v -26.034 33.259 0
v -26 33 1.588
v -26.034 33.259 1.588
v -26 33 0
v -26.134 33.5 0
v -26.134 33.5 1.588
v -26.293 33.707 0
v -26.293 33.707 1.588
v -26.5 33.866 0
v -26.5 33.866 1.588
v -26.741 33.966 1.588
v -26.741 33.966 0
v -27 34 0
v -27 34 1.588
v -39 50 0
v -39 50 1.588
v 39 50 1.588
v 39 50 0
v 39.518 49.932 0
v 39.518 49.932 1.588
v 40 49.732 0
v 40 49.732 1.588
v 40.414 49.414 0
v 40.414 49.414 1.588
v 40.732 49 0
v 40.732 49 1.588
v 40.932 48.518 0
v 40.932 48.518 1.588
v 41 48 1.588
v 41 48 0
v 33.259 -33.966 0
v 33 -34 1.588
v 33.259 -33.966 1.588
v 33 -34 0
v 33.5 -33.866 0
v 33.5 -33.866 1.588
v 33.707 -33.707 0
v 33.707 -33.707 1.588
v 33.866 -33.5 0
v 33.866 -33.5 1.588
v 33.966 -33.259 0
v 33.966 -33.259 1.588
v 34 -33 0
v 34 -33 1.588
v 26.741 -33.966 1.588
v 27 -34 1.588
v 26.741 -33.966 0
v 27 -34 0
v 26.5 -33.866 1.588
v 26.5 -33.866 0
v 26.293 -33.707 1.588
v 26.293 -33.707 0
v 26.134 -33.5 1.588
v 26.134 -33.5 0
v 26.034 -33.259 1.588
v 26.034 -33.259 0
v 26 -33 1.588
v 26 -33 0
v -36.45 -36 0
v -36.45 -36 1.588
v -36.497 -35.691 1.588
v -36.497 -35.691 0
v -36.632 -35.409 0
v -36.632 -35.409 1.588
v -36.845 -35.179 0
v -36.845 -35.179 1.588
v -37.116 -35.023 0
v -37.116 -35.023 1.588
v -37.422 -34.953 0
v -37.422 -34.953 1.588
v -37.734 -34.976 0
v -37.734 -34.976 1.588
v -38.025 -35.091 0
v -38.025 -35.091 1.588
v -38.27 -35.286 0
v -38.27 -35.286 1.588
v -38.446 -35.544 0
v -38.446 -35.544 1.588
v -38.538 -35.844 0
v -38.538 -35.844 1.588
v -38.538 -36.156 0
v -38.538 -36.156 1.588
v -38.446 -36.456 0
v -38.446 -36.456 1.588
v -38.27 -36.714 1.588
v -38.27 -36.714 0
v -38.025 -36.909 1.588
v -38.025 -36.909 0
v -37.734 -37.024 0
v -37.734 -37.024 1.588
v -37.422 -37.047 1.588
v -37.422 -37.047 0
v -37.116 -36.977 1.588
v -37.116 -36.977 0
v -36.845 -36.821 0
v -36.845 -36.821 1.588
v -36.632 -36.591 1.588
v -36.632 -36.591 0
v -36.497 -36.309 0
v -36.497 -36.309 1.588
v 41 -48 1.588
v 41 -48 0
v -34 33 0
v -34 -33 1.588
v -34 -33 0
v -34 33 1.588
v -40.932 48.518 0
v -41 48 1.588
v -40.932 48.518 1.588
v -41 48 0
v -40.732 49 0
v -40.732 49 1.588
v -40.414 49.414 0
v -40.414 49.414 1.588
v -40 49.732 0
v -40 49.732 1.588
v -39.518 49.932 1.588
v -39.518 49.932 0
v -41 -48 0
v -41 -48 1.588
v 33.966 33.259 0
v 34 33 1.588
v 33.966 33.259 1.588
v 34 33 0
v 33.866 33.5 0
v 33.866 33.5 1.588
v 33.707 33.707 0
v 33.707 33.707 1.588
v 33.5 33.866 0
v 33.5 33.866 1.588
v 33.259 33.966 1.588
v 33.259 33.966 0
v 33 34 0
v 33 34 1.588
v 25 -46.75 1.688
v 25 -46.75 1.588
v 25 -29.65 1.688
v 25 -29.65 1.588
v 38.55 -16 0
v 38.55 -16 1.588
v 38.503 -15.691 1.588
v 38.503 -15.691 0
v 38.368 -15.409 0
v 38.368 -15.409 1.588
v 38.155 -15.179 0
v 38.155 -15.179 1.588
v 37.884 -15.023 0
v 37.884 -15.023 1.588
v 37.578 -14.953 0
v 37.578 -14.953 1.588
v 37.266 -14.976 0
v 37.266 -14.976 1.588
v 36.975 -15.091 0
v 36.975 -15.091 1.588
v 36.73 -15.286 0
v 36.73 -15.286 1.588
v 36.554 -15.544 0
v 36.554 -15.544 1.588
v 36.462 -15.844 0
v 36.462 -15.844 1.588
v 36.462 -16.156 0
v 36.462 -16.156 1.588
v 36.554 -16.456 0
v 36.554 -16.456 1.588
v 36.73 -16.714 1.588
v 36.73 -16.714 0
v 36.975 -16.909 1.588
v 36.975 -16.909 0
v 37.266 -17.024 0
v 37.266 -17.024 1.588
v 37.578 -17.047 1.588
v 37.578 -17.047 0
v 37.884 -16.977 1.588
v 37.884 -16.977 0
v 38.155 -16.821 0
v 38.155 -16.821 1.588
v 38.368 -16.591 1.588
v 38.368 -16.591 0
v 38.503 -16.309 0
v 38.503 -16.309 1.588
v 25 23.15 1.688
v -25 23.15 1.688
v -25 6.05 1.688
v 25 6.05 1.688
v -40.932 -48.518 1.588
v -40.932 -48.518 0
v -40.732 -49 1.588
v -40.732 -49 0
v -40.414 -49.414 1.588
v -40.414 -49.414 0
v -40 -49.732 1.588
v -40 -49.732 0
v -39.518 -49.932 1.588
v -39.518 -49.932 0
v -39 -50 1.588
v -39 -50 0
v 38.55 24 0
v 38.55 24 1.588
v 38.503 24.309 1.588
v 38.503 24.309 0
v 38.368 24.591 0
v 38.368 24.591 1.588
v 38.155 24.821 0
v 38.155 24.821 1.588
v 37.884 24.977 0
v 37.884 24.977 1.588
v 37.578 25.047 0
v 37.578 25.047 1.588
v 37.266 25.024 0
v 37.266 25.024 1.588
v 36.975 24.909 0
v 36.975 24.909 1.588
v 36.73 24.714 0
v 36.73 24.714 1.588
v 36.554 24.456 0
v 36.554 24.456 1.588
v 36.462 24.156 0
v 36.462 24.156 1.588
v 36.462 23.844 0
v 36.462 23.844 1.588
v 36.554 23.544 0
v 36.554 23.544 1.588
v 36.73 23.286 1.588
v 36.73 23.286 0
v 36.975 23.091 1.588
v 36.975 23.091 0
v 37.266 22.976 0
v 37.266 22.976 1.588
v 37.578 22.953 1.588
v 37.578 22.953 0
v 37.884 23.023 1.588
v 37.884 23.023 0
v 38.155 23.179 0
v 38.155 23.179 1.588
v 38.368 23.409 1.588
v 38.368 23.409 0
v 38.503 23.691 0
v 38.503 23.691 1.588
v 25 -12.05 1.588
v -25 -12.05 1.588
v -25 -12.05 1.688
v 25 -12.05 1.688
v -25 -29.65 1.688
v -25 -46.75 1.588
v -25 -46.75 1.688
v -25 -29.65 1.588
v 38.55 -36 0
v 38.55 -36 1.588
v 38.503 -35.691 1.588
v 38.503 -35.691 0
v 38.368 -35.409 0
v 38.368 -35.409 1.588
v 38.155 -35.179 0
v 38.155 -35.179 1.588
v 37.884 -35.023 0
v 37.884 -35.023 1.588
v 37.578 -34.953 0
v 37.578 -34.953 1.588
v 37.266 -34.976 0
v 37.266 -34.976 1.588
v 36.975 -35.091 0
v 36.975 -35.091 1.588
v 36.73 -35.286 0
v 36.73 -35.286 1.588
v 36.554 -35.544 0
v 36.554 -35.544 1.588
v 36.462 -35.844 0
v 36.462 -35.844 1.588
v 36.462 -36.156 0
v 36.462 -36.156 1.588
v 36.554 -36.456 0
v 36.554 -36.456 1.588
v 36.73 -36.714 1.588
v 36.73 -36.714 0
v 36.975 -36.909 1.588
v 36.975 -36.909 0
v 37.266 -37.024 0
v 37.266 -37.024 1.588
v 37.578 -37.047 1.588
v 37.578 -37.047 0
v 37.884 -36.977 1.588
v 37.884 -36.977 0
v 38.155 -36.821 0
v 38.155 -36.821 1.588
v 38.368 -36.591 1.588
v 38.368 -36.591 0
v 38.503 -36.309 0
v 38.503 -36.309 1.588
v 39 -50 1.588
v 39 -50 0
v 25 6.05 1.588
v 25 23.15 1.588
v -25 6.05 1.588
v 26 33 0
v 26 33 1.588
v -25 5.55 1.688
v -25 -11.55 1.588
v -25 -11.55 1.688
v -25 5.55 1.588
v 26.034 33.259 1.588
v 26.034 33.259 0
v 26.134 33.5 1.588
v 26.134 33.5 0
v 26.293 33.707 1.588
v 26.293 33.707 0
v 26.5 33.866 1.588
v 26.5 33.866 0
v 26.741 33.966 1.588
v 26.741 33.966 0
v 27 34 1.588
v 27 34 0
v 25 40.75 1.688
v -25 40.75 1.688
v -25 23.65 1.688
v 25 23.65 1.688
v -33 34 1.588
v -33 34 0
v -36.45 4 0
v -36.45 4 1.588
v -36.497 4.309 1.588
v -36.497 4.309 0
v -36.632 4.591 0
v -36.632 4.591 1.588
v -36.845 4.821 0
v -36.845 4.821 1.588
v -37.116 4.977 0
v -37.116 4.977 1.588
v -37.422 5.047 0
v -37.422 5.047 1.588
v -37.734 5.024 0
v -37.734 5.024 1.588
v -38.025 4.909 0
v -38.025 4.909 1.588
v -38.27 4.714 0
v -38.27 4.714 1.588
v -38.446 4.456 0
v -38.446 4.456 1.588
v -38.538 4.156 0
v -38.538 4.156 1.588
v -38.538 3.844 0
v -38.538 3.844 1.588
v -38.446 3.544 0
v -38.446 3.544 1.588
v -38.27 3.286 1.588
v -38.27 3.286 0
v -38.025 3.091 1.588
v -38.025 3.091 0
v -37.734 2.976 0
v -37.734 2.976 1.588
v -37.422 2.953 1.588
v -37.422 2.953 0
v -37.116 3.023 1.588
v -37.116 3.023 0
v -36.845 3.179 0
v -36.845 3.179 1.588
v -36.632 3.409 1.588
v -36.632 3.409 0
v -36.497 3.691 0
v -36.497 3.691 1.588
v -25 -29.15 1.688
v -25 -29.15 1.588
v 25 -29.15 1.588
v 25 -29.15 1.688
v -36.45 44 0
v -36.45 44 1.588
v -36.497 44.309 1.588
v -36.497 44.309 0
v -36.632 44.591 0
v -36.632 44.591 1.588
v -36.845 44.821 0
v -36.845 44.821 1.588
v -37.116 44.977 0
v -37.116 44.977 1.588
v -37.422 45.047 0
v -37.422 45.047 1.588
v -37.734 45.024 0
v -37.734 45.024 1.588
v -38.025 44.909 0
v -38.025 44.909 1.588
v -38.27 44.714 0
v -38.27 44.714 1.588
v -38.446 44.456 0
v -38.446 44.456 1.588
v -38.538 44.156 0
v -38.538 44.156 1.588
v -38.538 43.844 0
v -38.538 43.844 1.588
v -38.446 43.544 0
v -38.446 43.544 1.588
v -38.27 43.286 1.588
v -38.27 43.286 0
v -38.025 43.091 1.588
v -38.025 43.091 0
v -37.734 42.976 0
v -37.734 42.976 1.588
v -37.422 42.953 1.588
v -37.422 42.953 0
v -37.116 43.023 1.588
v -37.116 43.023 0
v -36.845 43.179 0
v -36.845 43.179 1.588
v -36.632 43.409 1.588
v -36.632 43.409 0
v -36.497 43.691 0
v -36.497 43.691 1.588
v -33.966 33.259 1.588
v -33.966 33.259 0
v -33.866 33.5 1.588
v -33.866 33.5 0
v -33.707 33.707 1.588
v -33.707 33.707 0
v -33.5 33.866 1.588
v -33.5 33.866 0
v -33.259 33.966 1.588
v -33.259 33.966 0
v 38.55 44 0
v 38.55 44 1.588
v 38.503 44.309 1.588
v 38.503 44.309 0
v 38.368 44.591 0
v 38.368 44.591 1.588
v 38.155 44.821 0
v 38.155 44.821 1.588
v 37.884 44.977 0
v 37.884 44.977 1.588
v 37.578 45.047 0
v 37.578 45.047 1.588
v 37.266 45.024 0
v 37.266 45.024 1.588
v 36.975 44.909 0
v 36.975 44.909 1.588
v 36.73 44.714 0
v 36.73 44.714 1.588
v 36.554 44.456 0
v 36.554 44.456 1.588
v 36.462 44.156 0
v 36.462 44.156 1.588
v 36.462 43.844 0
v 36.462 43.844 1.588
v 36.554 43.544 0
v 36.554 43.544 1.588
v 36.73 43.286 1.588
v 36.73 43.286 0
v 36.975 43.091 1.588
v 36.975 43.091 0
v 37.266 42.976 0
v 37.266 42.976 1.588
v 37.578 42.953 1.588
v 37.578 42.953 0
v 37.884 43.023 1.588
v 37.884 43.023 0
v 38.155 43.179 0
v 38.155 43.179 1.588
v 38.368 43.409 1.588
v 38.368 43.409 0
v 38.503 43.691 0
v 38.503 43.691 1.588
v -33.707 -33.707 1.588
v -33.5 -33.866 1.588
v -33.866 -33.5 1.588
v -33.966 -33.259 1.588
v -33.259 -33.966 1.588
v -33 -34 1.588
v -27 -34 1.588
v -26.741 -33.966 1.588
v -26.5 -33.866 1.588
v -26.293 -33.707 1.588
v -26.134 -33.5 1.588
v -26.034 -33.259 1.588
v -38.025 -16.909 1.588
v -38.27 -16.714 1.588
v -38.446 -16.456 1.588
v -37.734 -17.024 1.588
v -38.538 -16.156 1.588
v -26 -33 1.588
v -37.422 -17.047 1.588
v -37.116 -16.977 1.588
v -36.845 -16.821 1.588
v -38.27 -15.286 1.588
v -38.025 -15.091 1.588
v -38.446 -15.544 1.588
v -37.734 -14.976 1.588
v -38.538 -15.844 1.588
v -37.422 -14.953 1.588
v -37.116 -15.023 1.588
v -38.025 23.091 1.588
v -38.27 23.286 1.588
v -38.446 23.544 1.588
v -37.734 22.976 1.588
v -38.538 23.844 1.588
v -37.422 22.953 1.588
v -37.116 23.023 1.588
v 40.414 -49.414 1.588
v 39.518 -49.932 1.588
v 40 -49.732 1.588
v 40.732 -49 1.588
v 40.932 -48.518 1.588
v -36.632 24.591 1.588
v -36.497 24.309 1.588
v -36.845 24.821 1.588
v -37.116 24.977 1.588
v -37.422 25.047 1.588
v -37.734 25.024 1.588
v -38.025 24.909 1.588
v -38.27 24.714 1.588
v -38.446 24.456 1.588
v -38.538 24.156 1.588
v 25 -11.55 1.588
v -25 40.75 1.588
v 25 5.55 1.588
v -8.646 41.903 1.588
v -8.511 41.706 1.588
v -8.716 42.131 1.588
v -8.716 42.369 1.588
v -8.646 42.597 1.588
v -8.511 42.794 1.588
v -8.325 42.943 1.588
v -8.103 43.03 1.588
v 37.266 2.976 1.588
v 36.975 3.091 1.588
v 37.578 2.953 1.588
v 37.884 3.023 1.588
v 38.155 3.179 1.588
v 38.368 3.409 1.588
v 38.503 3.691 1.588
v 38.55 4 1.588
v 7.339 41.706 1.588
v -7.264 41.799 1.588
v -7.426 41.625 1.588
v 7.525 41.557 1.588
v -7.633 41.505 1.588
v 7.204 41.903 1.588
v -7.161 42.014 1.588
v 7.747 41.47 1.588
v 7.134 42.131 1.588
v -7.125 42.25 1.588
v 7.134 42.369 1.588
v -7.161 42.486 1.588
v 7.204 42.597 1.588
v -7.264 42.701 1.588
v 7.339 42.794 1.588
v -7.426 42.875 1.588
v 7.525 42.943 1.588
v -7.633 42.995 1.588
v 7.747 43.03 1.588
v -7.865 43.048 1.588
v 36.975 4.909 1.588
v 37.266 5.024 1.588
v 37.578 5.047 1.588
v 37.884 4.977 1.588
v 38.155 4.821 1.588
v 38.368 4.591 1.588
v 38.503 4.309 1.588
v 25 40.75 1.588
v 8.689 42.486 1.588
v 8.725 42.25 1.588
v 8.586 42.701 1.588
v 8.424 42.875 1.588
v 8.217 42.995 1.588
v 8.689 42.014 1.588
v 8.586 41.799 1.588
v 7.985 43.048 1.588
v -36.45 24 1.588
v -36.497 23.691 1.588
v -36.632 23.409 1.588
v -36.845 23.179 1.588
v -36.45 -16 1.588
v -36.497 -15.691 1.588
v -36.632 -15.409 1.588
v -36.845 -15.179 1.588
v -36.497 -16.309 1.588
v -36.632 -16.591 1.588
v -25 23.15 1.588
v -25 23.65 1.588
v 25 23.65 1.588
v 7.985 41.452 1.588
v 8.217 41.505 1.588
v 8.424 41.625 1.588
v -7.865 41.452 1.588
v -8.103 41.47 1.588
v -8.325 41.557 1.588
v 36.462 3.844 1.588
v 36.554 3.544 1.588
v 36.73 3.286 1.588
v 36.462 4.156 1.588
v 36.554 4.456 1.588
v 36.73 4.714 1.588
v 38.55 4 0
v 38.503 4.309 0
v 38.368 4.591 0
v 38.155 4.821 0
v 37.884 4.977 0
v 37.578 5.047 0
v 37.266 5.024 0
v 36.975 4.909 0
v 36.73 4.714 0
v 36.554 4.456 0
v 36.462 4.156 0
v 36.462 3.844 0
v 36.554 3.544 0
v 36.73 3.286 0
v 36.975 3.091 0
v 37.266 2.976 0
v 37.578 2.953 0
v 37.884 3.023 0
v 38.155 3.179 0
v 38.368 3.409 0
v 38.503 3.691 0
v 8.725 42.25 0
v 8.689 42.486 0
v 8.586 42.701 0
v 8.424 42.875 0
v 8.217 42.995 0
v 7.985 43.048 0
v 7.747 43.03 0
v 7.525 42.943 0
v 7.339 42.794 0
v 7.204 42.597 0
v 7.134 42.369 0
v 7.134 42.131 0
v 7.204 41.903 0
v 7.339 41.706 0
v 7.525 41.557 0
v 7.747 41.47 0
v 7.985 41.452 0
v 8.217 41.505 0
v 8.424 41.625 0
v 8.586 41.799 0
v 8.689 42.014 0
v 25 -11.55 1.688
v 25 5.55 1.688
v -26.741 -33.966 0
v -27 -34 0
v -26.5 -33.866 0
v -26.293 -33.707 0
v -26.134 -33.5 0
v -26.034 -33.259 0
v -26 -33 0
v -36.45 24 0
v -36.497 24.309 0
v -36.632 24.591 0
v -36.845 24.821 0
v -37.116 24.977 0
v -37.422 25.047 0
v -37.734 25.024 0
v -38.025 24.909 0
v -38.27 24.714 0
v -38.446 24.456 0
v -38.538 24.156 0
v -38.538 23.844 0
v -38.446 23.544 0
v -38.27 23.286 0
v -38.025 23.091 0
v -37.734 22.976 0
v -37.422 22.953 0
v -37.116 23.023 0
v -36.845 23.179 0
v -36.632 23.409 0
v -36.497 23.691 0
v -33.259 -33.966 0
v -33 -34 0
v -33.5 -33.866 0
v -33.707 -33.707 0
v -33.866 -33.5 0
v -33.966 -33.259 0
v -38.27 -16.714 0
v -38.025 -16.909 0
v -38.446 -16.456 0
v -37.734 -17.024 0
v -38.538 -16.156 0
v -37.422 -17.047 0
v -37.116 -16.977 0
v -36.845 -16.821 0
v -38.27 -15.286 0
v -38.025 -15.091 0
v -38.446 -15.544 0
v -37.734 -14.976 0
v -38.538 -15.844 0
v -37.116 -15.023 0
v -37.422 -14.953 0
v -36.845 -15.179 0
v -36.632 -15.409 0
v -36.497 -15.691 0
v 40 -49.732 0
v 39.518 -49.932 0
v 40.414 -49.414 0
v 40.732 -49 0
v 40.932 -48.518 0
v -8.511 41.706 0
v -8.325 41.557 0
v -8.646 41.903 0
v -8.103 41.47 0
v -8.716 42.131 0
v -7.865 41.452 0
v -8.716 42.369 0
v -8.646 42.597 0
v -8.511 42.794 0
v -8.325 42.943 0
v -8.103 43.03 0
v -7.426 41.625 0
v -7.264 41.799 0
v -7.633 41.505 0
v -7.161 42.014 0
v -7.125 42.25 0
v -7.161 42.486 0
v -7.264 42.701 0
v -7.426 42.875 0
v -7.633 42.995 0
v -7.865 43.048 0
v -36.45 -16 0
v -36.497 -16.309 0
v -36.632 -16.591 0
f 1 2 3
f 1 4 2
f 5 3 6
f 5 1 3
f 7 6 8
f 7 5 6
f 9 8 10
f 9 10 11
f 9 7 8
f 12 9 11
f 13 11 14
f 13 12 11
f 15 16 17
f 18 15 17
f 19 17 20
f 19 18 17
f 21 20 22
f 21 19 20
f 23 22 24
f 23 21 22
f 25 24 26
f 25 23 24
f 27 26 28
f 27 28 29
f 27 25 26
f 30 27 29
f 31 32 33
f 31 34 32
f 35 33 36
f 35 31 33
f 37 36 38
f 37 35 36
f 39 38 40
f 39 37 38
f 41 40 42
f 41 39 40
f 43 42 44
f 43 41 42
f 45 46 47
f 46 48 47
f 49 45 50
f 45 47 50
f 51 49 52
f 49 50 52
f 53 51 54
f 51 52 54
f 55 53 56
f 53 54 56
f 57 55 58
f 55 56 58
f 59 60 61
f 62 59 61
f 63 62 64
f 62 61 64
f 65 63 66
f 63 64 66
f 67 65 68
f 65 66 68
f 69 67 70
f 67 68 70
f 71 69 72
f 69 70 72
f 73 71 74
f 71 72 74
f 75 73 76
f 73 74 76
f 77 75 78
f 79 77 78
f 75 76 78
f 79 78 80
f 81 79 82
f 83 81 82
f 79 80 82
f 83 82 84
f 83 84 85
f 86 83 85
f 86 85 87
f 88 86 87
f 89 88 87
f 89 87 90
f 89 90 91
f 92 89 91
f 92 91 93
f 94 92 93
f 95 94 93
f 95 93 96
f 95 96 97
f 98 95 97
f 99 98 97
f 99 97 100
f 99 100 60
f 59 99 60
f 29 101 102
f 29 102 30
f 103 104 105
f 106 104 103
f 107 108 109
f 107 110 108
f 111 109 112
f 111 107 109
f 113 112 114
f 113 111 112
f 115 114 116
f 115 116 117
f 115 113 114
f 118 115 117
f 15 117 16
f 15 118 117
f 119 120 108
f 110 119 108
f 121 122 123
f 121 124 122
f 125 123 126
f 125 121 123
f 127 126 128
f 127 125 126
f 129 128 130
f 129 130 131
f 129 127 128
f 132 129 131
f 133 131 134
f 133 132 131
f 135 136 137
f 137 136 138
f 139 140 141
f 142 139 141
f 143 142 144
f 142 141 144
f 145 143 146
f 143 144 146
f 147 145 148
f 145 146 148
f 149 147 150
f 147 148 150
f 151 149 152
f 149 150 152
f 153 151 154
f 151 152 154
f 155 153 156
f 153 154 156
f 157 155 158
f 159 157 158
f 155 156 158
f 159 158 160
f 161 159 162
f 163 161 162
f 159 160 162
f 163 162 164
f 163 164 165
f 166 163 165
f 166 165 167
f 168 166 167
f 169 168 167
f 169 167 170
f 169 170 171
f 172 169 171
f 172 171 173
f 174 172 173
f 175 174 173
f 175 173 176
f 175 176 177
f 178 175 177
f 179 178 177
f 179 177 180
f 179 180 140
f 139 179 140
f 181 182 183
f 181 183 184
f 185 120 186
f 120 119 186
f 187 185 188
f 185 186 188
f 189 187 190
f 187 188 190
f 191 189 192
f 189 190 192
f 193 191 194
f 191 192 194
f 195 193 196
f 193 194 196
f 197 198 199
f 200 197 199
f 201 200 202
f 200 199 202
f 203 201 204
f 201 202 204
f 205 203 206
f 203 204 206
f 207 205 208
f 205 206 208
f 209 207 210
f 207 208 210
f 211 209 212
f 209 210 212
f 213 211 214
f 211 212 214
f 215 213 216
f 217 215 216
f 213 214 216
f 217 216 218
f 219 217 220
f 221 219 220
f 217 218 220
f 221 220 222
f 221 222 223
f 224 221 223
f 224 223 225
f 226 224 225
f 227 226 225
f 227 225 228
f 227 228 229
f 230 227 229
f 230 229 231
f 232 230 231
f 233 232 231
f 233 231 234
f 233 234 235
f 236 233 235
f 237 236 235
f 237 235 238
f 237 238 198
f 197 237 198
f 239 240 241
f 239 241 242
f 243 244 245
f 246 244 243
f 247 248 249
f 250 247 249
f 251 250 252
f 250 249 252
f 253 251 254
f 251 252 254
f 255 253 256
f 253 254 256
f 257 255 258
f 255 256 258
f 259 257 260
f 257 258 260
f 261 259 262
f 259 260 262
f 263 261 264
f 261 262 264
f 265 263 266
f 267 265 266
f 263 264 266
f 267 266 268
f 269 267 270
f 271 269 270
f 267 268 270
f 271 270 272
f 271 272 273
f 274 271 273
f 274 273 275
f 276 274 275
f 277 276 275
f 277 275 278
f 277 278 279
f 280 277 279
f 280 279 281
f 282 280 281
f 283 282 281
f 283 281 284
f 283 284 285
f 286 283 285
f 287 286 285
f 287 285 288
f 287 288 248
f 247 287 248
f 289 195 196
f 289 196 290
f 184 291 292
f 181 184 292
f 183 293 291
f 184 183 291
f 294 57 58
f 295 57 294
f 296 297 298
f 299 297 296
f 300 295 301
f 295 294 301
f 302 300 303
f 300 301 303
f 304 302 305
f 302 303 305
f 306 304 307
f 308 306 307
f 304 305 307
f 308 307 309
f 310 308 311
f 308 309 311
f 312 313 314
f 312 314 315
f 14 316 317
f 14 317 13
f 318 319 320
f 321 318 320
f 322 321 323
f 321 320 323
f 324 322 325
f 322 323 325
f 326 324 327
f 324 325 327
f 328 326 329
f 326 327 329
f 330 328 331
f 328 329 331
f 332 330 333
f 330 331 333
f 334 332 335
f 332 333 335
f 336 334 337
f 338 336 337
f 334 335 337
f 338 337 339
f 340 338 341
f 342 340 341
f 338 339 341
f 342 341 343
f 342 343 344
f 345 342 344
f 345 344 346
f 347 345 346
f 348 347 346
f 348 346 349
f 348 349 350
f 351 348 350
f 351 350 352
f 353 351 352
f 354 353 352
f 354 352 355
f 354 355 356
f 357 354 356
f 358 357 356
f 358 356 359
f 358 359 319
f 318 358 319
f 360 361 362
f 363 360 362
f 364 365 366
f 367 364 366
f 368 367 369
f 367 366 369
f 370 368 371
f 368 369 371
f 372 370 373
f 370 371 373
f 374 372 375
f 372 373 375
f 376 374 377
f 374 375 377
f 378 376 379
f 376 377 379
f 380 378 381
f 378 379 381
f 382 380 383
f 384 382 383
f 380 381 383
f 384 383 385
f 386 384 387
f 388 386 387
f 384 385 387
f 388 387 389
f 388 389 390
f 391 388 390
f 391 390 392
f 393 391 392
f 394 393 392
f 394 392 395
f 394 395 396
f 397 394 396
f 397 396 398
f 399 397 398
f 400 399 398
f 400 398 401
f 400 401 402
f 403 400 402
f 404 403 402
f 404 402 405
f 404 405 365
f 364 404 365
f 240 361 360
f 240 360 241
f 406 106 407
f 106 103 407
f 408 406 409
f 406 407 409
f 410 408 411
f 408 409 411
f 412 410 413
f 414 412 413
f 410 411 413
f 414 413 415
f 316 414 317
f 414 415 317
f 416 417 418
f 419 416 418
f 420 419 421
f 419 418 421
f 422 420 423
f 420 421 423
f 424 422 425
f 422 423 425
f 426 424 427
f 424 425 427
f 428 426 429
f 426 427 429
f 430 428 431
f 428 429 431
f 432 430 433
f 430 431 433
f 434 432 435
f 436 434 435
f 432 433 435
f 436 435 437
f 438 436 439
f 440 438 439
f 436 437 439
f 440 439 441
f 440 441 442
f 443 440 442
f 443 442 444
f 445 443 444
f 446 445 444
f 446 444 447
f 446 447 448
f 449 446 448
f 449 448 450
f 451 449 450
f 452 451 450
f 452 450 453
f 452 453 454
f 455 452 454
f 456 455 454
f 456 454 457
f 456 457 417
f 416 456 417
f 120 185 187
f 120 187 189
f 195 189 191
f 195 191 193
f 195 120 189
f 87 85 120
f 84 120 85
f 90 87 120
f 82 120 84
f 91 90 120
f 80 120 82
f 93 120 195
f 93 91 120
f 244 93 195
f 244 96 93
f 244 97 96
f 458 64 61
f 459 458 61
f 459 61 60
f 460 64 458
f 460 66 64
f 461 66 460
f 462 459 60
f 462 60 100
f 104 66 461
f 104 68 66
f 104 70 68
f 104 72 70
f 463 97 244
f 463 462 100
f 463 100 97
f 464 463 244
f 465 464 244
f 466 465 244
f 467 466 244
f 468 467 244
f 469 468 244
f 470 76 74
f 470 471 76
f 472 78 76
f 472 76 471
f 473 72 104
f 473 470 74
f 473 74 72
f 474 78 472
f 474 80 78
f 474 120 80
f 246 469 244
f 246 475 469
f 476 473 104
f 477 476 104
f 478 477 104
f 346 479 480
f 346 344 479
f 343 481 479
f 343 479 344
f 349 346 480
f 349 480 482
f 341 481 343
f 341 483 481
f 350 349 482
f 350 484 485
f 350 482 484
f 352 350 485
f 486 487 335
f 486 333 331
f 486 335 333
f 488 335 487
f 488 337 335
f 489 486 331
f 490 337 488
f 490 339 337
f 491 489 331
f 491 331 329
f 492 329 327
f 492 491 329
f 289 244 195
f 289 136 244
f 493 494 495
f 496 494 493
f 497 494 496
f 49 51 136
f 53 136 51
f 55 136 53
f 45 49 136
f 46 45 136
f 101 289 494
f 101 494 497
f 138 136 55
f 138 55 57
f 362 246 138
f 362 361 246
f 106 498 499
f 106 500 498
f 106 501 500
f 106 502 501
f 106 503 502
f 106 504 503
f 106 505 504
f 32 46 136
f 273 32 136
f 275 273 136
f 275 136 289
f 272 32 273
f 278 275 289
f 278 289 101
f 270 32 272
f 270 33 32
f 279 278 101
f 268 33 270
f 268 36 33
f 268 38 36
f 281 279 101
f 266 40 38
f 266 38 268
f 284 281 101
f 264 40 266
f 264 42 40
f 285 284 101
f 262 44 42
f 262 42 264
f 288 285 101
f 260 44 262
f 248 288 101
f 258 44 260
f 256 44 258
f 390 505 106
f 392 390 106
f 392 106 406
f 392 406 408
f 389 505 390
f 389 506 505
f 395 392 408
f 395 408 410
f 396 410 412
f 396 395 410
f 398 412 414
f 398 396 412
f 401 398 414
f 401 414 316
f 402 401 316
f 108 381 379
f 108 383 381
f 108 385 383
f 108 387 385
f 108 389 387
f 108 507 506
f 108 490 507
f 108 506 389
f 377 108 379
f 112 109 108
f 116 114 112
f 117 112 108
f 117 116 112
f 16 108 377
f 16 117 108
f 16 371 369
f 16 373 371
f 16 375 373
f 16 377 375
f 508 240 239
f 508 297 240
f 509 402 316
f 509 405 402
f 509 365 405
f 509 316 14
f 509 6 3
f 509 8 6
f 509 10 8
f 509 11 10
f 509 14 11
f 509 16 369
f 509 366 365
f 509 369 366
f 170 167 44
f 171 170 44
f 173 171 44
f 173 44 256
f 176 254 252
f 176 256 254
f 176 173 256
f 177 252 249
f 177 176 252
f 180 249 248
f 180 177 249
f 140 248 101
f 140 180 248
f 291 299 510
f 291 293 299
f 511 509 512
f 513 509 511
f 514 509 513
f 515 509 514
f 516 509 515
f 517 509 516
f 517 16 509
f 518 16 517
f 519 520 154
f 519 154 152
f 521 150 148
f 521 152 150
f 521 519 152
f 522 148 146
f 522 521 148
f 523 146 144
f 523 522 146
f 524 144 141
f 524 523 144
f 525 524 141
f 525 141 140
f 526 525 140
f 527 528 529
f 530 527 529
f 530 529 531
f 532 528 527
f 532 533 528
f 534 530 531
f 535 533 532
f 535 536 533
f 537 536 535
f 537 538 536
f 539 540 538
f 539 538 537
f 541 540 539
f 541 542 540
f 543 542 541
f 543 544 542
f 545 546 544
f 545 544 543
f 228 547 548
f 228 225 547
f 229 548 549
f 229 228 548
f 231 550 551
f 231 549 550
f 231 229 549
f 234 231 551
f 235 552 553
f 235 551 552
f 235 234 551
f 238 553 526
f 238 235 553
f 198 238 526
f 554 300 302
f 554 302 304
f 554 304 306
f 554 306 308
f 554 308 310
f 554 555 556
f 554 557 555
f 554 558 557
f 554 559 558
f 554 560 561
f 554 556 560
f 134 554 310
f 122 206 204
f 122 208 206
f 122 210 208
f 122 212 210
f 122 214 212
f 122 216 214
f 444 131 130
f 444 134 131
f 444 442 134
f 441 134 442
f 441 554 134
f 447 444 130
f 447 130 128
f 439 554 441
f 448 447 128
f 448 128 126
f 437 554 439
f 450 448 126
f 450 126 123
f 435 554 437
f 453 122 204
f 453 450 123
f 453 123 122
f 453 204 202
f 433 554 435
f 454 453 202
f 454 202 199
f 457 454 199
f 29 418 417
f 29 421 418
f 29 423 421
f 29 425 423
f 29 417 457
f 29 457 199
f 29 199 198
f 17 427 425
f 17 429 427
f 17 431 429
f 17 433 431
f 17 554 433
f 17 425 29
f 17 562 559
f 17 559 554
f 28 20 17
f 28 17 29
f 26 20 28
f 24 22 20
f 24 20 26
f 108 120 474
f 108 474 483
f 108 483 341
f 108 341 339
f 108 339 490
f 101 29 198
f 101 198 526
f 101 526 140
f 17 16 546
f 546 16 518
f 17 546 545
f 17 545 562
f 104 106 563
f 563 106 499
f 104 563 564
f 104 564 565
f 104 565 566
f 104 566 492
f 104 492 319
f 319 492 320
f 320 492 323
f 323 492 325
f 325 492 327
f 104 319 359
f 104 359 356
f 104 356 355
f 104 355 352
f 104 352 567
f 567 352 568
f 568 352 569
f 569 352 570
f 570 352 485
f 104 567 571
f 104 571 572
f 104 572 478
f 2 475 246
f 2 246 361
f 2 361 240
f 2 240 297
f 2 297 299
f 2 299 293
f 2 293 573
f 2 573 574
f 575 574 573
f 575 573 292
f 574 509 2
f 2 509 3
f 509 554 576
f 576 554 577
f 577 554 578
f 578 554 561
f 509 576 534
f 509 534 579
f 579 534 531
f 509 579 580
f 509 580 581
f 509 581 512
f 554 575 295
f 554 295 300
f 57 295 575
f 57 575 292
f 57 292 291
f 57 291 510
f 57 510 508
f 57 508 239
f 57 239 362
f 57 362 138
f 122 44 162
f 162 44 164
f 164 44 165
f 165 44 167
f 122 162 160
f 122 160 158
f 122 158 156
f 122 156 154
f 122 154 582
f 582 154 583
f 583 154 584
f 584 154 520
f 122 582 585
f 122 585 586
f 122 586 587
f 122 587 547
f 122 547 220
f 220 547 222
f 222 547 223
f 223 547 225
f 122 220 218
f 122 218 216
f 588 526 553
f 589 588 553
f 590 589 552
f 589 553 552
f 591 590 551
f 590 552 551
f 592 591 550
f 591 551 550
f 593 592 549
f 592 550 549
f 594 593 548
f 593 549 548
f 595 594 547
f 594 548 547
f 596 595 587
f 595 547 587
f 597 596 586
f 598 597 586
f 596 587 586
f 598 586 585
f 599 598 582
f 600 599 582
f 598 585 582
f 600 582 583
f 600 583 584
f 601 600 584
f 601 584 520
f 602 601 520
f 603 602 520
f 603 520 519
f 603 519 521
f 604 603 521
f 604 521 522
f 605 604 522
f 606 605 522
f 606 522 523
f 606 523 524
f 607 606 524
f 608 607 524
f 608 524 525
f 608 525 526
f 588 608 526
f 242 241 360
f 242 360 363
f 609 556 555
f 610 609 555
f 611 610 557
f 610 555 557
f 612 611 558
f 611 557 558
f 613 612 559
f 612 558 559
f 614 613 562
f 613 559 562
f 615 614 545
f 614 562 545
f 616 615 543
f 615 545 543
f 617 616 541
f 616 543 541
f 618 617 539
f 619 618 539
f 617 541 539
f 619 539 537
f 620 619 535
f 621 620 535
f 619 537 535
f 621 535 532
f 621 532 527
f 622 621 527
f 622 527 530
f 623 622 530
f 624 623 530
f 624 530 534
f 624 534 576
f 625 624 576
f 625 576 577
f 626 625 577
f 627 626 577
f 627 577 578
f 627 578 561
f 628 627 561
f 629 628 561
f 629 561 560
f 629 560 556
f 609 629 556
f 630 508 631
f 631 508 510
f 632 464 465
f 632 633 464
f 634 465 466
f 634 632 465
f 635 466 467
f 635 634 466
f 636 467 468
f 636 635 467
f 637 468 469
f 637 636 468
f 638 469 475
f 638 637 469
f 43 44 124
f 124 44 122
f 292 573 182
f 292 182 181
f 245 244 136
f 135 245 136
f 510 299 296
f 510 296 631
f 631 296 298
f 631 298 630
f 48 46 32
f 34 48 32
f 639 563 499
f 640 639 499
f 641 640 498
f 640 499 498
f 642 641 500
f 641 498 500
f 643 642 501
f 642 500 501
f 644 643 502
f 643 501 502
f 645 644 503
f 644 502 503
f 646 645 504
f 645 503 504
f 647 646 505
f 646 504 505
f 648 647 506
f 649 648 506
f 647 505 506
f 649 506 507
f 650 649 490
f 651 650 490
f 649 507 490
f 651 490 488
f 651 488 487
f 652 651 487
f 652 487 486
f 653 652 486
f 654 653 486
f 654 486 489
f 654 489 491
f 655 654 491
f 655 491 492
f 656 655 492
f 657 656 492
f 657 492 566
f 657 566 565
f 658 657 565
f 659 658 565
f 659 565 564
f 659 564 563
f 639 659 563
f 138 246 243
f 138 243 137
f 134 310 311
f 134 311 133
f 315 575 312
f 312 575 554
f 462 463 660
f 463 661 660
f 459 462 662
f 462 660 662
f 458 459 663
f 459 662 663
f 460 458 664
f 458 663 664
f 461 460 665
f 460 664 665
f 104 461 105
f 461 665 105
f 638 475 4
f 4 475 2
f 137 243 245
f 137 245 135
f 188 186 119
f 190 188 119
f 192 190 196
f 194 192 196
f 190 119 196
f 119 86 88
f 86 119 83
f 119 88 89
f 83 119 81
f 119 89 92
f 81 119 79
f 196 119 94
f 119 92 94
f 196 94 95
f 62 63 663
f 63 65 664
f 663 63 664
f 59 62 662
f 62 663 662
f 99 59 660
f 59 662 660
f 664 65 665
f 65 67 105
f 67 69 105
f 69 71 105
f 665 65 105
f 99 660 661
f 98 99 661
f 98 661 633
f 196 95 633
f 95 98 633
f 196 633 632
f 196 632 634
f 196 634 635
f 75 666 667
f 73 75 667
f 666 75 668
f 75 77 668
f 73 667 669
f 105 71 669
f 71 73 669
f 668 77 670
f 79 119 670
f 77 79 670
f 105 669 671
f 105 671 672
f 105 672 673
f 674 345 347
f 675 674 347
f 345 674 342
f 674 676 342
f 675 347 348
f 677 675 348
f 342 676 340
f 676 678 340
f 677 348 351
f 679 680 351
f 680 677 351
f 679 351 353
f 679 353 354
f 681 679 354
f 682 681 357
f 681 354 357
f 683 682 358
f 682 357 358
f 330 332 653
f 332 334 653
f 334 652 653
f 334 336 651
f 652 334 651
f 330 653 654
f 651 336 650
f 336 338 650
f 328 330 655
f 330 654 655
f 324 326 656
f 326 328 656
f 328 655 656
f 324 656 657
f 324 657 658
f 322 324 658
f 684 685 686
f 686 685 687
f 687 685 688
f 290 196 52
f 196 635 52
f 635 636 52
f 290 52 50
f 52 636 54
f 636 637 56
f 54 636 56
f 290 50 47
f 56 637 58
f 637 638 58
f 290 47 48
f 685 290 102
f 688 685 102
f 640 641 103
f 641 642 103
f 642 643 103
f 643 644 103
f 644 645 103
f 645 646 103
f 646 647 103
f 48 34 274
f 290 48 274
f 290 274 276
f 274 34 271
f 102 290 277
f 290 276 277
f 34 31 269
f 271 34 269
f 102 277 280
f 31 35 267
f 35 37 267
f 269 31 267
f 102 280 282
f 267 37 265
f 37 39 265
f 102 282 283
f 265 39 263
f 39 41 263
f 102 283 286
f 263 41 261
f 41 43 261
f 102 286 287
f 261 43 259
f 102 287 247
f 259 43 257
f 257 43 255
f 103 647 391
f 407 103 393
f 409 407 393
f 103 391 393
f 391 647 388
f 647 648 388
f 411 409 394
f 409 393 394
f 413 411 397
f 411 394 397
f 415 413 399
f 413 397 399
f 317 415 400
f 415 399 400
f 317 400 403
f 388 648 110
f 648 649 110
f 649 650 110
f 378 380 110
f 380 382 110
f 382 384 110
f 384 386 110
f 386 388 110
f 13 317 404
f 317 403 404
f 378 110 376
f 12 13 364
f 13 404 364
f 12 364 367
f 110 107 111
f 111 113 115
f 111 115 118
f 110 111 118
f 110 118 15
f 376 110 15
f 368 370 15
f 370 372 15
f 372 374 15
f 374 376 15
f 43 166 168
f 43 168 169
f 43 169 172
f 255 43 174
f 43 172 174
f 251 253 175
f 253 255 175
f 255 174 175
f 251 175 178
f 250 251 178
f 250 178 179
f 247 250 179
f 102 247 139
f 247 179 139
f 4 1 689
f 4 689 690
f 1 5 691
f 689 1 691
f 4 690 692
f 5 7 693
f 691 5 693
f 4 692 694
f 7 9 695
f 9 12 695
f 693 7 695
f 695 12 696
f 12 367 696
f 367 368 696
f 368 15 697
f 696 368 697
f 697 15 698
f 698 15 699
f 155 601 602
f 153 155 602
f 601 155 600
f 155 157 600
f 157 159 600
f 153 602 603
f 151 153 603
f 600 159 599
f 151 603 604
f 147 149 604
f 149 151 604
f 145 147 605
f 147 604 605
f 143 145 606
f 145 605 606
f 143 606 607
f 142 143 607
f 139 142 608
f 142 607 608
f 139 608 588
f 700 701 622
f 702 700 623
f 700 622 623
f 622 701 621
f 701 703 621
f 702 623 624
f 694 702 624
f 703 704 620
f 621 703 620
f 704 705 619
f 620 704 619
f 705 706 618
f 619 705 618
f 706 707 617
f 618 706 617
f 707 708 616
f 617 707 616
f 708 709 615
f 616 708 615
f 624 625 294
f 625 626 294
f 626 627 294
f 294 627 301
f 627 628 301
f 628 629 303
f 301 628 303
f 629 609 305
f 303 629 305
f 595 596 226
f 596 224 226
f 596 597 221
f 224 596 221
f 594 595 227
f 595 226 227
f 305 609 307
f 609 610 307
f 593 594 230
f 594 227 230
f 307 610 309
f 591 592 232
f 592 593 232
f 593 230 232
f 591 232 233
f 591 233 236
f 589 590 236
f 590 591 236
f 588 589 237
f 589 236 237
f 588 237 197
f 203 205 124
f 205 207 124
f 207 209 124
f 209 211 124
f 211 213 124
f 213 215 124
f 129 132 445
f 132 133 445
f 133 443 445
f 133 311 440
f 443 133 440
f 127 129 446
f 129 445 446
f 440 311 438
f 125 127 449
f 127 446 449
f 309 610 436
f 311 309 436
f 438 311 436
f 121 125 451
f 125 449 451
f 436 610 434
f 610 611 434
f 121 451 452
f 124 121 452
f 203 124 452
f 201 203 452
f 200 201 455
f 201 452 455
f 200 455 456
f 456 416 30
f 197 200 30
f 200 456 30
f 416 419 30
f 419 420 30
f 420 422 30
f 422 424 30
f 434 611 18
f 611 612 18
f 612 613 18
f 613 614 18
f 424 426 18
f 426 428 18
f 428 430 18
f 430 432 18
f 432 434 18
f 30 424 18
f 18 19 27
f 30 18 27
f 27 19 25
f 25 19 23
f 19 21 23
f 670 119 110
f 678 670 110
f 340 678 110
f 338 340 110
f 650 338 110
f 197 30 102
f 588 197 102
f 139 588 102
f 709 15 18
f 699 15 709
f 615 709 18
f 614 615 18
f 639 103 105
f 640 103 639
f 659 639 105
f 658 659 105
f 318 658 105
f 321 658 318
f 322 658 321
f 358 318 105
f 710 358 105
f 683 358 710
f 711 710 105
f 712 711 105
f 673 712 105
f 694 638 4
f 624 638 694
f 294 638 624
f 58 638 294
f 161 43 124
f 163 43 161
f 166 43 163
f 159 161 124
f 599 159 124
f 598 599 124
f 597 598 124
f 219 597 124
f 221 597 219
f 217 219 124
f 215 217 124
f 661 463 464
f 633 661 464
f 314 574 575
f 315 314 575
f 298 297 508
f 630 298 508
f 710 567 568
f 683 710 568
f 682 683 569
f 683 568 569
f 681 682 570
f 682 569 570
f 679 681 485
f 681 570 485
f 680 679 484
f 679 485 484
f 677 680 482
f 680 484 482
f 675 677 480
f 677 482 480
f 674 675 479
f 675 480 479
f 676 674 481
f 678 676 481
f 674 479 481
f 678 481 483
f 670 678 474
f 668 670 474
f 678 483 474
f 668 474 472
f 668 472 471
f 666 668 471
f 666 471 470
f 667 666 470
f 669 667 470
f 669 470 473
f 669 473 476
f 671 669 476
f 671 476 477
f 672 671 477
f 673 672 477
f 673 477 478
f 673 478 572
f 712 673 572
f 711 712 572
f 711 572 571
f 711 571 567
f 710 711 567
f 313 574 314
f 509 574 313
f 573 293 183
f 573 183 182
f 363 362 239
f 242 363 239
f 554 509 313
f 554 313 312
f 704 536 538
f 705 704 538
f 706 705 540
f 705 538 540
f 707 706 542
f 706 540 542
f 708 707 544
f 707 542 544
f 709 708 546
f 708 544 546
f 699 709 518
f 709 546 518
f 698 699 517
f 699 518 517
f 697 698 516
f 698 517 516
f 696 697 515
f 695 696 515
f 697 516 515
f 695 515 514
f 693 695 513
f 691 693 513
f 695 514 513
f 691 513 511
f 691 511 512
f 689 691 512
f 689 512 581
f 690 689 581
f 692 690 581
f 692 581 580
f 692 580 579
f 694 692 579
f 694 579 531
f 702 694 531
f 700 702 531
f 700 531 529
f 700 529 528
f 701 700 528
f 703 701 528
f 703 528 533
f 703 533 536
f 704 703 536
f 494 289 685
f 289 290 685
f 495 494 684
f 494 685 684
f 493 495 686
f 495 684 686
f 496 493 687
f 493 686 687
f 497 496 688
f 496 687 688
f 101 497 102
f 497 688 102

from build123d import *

# Parameters (mm, degrees)
SKETCH1_W          = 82
SKETCH1_H          = 100
BOARD_DEPTH        = 1.5875
SKETCH2_W          = 8
SKETCH2_H          = 68
ACCESS_HOLES_DEPTH = 65.680137262
SCREW_HOLES_D      = 2.1
CONNECTOR_HOLES_D  = 1.6
SKETCH4_W          = 50
SKETCH4_H          = 17.1
SOLAR_CELLS_DEPTH  = 0.1
OUTER_RADIUS_R     = 2
ACCESS_FILLET_R    = 1


with BuildPart() as part:
    # Sketch1 → board (new body)
    with BuildSketch(Plane.XY.offset(1.5875)):
        Rectangle(SKETCH1_W, SKETCH1_H)
    extrude(amount=-BOARD_DEPTH)

    # Sketch2 → access holes (cut, through all)
    with BuildSketch(Plane.XY.offset(1.5875)):
        with Locations((-30, 0)):
            Rectangle(SKETCH2_W, SKETCH2_H)
        with Locations((30, 0)):
            Rectangle(SKETCH2_W, SKETCH2_H)
    extrude(amount=-ACCESS_HOLES_DEPTH, mode=Mode.SUBTRACT)

    # screw holes (through all)
    with Locations(Plane(origin=(0, 0, 0), x_dir=(-1, 0, 0), z_dir=(0, 0, -1))):
        with Locations((37.5, 44), (37.5, 24), (37.5, 4), (37.5, -16), (37.5, -36), (-37.5, -36), (-37.5, -16), (-37.5, 4), (-37.5, 24), (-37.5, 44)):
            Hole(SCREW_HOLES_D / 2)

    # connector holes (through all)
    with Locations(Plane(origin=(0, 0, 0), x_dir=(-1, 0, 0), z_dir=(0, 0, -1))):
        with Locations((7.925, 42.25), (-7.925, 42.25)):
            Hole(CONNECTOR_HOLES_D / 2)

    # Sketch4 → solar cells (add)
    with BuildSketch(Plane.XY.offset(1.5875)):
        with Locations((0, 32.2)):
            Rectangle(SKETCH4_W, SKETCH4_H)
        with Locations((0, 14.6)):
            Rectangle(SKETCH4_W, SKETCH4_H)
        with Locations((0, -3)):
            Rectangle(SKETCH4_W, SKETCH4_H)
        with Locations((0, -20.6)):
            Rectangle(SKETCH4_W, SKETCH4_H)
        with Locations((0, -38.2)):
            Rectangle(SKETCH4_W, SKETCH4_H)
    extrude(amount=SOLAR_CELLS_DEPTH)

    # outer radius
    outer_radius_edges = [part.edges().sort_by_distance(p)[0] for p in [
        (-41, -50, 0.79375),
        (-41, 50, 0.79375),
        (41, 50, 0.79375),
        (41, -50, 0.79375),
    ]]
    fillet(outer_radius_edges, radius=OUTER_RADIUS_R)

    # access fillet
    access_fillet_edges = [part.edges().sort_by_distance(p)[0] for p in [
        (-26, 34, 0.79375),
        (-26, -34, 0.79375),
        (-34, -34, 0.79375),
        (-34, 34, 0.79375),
        (34, 34, 0.79375),
        (34, -34, 0.79375),
        (26, -34, 0.79375),
        (26, 34, 0.79375),
    ]]
    fillet(access_fillet_edges, radius=ACCESS_FILLET_R)


solid = part.part
